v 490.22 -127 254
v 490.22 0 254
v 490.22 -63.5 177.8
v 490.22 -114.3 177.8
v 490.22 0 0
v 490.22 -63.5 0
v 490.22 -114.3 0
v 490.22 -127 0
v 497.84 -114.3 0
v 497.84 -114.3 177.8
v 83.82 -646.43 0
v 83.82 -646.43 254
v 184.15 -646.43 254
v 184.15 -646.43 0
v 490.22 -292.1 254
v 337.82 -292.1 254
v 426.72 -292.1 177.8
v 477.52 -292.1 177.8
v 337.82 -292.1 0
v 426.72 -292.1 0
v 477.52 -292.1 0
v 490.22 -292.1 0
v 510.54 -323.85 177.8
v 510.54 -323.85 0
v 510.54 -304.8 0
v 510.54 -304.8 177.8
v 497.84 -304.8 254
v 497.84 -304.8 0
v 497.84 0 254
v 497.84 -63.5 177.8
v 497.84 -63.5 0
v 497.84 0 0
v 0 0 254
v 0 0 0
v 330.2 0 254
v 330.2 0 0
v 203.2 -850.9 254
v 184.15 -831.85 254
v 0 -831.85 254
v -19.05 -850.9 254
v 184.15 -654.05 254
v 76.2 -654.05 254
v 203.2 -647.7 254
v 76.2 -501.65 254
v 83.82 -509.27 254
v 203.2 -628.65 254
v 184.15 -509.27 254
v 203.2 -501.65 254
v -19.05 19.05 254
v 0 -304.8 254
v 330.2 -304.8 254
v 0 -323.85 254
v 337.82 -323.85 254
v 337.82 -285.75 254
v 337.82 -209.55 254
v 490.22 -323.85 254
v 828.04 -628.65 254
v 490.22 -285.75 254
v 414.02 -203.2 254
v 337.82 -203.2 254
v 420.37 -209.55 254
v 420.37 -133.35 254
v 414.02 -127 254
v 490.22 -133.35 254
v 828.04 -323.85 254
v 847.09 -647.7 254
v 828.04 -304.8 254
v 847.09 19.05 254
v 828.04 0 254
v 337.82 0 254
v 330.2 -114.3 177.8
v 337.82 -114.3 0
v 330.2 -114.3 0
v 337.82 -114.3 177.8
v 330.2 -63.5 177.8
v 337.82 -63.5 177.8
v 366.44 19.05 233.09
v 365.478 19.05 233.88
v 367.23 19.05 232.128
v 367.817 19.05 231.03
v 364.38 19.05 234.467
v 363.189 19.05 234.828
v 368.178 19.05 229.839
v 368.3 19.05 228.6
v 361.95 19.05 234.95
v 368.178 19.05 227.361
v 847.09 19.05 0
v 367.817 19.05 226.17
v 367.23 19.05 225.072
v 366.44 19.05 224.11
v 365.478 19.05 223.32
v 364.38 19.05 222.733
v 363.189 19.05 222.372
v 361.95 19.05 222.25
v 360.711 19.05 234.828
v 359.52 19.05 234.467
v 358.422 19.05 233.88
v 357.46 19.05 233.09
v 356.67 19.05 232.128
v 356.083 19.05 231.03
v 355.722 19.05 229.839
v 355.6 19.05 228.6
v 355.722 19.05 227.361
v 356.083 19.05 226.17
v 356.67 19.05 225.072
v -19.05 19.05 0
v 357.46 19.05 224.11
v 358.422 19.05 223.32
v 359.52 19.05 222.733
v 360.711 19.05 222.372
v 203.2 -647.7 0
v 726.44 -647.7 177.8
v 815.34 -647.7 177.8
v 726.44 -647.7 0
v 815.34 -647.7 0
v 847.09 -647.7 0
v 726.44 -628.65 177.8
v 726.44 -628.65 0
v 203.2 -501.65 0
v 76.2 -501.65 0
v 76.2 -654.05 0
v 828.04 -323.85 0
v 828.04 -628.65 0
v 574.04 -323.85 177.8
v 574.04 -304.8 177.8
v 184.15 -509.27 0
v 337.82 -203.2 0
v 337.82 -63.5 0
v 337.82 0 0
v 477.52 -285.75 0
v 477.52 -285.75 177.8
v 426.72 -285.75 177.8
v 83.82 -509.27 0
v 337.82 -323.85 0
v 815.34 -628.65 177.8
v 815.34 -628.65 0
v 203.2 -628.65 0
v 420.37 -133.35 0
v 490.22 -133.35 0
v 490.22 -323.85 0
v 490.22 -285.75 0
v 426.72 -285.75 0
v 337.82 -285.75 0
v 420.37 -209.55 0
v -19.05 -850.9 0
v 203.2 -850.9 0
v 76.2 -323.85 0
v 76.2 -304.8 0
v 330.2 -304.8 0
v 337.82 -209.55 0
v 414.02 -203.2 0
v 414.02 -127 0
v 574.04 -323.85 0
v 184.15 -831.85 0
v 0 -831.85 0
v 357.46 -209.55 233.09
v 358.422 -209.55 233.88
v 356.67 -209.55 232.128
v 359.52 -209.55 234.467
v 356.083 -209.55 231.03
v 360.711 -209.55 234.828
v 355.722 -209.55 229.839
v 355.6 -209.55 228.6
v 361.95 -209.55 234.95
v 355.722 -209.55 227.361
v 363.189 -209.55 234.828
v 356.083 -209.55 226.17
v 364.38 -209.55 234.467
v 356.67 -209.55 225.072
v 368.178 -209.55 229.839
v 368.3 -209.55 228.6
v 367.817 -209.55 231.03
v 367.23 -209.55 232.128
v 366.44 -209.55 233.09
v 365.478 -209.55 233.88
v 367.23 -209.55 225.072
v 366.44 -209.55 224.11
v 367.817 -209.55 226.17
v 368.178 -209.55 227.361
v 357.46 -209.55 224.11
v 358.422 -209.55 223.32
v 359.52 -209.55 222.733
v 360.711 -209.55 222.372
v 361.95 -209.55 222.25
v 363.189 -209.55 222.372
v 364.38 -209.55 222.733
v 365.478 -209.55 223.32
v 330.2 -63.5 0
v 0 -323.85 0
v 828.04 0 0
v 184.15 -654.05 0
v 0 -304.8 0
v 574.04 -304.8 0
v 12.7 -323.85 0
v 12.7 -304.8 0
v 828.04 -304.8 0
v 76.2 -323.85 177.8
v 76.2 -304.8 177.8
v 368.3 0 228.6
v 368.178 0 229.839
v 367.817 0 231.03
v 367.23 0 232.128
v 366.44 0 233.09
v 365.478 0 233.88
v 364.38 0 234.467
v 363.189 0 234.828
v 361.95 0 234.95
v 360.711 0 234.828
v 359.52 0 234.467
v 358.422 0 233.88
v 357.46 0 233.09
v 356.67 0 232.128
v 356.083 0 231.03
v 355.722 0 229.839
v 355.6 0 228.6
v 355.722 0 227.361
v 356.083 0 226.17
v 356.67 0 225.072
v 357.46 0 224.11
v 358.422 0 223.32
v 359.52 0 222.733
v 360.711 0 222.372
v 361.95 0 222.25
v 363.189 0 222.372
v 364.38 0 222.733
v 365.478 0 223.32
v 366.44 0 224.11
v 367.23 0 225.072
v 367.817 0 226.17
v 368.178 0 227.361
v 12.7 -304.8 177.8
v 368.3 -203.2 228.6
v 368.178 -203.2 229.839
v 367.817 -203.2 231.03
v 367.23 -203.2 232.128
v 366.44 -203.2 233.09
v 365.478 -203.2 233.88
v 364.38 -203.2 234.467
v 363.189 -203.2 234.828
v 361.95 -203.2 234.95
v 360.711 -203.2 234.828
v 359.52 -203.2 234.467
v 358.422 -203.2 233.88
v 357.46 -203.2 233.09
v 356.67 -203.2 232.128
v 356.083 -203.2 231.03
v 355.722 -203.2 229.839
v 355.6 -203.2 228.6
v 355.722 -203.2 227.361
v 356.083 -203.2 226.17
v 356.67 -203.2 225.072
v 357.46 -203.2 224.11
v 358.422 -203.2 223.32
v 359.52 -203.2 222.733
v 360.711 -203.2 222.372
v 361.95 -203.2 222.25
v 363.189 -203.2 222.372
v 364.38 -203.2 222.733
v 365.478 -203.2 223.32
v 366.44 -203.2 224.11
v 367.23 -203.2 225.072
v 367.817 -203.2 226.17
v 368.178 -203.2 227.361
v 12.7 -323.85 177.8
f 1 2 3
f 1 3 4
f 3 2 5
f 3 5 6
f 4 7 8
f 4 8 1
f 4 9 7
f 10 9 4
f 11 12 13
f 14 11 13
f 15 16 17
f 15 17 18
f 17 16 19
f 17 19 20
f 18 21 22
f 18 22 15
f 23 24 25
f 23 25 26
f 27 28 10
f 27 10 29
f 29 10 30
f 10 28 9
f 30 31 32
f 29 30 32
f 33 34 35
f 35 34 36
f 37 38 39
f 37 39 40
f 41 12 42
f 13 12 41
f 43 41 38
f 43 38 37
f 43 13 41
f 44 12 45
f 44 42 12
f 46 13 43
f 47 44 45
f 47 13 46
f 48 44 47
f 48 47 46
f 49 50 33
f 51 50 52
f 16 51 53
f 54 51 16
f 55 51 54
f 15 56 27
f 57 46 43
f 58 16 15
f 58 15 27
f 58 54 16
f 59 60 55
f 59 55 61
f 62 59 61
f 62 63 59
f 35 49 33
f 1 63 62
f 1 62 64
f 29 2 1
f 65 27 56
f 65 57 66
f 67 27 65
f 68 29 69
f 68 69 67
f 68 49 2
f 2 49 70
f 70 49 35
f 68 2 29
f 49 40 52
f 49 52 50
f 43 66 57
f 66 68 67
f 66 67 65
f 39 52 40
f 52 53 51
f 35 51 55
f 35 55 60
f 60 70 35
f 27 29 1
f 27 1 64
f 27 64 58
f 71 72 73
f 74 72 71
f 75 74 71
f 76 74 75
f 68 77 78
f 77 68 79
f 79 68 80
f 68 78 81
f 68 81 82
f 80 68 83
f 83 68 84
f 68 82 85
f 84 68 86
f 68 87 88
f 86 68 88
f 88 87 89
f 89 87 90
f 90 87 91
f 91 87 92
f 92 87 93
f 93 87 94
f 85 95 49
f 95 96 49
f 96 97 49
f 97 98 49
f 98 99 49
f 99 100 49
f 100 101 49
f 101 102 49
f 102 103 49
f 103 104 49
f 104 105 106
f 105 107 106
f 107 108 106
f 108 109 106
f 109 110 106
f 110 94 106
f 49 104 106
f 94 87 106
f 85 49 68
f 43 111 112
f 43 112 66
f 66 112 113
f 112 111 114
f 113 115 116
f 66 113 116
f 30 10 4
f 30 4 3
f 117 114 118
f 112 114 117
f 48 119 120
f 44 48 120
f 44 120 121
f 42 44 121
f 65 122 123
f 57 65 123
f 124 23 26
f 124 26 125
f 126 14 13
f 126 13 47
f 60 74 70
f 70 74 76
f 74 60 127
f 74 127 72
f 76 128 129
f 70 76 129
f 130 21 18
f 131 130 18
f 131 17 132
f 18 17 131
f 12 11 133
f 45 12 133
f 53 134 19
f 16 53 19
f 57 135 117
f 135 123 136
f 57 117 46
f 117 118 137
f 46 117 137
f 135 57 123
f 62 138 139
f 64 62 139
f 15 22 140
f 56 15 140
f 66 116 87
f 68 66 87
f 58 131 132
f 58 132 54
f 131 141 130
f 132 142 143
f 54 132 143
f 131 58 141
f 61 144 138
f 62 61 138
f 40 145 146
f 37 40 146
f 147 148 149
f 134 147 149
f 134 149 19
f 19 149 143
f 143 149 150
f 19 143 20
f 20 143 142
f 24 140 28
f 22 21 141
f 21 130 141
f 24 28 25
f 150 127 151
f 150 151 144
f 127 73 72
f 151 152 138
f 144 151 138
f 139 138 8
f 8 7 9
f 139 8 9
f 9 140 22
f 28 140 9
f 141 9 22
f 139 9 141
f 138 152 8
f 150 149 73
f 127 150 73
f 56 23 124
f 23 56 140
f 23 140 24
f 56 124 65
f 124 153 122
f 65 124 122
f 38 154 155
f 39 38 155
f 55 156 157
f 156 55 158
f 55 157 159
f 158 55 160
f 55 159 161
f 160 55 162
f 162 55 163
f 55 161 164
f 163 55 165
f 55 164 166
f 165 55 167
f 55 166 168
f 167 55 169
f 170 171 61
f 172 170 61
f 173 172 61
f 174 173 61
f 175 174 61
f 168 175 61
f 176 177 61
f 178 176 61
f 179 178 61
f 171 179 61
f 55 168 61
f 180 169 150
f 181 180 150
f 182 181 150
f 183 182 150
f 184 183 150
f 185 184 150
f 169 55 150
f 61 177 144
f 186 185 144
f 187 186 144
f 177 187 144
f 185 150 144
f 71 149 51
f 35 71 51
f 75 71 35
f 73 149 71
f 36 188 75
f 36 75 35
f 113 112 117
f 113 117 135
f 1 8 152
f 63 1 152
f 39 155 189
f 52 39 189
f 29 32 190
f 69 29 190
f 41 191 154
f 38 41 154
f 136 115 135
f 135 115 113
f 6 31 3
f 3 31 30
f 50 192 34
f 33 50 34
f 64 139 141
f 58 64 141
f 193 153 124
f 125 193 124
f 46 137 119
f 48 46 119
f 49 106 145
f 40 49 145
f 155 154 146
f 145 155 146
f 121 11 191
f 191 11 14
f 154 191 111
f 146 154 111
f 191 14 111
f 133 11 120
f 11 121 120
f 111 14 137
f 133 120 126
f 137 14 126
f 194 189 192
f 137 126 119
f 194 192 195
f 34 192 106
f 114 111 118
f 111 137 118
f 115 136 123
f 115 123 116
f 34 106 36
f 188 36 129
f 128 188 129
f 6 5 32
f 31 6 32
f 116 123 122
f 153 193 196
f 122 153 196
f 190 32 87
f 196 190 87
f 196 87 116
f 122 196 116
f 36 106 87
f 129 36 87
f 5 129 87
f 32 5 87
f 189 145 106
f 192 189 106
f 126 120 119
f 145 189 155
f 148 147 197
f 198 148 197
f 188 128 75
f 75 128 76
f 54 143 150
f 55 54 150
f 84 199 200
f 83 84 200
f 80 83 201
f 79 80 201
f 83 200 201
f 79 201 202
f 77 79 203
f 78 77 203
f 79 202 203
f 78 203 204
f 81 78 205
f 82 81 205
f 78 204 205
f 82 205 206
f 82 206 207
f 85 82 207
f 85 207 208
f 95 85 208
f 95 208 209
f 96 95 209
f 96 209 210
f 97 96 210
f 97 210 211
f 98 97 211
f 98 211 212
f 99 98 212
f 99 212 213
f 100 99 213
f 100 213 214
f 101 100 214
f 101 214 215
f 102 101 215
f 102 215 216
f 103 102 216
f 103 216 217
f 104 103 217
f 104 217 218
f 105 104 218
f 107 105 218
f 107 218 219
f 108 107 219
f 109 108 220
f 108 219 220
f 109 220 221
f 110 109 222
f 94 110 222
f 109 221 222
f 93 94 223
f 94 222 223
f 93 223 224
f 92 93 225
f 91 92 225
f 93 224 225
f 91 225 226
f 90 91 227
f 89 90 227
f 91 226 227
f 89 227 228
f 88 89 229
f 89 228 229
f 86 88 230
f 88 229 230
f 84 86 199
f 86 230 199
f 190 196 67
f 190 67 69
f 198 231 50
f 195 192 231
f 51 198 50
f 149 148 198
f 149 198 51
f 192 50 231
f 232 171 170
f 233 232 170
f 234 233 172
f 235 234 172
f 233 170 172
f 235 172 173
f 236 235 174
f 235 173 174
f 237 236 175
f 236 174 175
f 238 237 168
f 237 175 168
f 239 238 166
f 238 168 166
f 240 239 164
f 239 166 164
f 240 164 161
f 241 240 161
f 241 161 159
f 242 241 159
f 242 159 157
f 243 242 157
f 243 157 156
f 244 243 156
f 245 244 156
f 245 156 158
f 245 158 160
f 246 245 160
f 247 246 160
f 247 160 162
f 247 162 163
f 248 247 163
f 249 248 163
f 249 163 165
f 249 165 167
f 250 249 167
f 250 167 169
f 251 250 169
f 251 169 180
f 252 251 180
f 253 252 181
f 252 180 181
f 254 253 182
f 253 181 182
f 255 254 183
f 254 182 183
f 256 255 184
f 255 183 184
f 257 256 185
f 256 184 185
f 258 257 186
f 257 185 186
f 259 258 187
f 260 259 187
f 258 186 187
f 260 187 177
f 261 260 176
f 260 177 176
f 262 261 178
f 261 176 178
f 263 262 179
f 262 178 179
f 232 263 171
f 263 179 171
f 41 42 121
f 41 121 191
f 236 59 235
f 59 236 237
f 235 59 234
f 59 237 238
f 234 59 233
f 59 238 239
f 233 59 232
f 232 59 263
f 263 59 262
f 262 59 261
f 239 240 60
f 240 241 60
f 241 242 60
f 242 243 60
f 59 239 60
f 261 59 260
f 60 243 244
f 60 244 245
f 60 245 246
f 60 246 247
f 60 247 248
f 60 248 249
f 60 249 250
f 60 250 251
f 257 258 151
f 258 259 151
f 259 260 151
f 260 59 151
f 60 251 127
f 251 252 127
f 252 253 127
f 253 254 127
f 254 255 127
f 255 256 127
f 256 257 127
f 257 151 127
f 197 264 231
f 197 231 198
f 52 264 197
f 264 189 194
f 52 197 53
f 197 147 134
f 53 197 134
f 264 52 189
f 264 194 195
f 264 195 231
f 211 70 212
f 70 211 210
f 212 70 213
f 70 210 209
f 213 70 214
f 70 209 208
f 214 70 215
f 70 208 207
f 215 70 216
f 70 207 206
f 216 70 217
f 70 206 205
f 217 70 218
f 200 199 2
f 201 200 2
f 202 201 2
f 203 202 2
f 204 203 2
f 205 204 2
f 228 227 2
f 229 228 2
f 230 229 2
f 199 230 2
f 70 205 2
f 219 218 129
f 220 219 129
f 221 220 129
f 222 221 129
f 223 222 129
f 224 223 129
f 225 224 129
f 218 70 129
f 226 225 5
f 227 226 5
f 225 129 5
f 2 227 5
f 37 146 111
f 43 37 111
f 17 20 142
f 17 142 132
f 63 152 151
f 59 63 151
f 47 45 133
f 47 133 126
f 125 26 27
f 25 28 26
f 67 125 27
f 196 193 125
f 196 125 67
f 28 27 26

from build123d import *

# Parameters (mm, degrees)
F0_W      = 100.33
F0_H      = 137.16
F0_W_2    = 330.2
F0_H_2    = 304.8
F1_DEPTH  = 254
F2_W      = 50.8
F2_H      = 177.8
F3_DEPTH  = 25.4
F4_W      = 50.8
F4_H      = 177.8
F5_DEPTH  = 177.8
F6_W      = 63.5
F6_H      = 177.8
F7_DEPTH  = 25.4
F8_W      = 63.5
F8_H      = 177.8
F9_DEPTH  = 25.4
F10_W     = 88.9
F10_H     = 177.8
F11_DEPTH = 25.4
F12_R     = 6.35
F13_DEPTH = 228.6


with BuildPart() as f1:
    # F0 (on Top) → F1 (new body)
    with BuildSketch(Plane.XY):
        Polygon((847.09, 19.05), (-19.05, 19.05), (-19.05, -323.85), (-19.05, -850.9), (203.2, -850.9), (203.2, -647.7), (847.09, -647.7), align=None)
        with Locations((133.985, -577.85)):
            Rectangle(F0_W, F0_H, mode=Mode.SUBTRACT)
        Polygon((828.04, -628.65), (203.2, -628.65), (203.2, -501.65), (76.2, -501.65), (76.2, -654.05), (184.15, -654.05), (184.15, -831.85), (0, -831.85), (0, -323.85), (337.82, -323.85), (337.82, -292.1), (490.22, -292.1), (490.22, -323.85), (668.02, -323.85), (675.64, -323.85), (828.04, -323.85), (828.04, -450.85), (828.04, -458.47), align=None, mode=Mode.SUBTRACT)
        with Locations((165.1, -152.4)):
            Rectangle(F0_W_2, F0_H_2, mode=Mode.SUBTRACT)
        Polygon((337.82, -285.75), (337.82, -209.55), (420.37, -209.55), (420.37, -133.35), (490.22, -133.35), (490.22, -285.75), align=None, mode=Mode.SUBTRACT)
        Polygon((337.82, -203.2), (337.82, 0), (490.22, 0), (490.22, -127), (414.02, -127), (414.02, -203.2), align=None, mode=Mode.SUBTRACT)
        with Locations((662.94, -152.4)):
            Rectangle(F0_W_2, F0_H_2, mode=Mode.SUBTRACT)
    extrude(amount=F1_DEPTH)

    # F2 (on face) → F3 (cut)
    with BuildSketch(Plane.XZ.offset(292.1)):
        with Locations((452.12, 88.9)):
            Rectangle(F2_W, F2_H)
    extrude(amount=-F3_DEPTH, mode=Mode.SUBTRACT)

    # F4 (on face) → F5 (cut)
    with BuildSketch(Plane.YZ.offset(497.84)):
        with Locations((-88.9, 88.9)):
            Rectangle(F4_W, F4_H)
    extrude(amount=-F5_DEPTH, mode=Mode.SUBTRACT)

    # F6 (on face) → F7 (cut)
    with BuildSketch(Plane.XZ.offset(323.85)):
        with Locations((44.45, 88.9)):
            Rectangle(F6_W, F6_H)
    extrude(amount=-F7_DEPTH, mode=Mode.SUBTRACT)

    # F8 (on face) → F9 (cut)
    with BuildSketch(Plane.XZ.offset(323.85)):
        with Locations((542.29, 88.9)):
            Rectangle(F8_W, F8_H)
    extrude(amount=-F9_DEPTH, mode=Mode.SUBTRACT)

    # F10 (on face) → F11 (cut)
    with BuildSketch(Plane.XZ.offset(647.7)):
        with Locations((770.89, 88.9)):
            Rectangle(F10_W, F10_H)
    extrude(amount=-F11_DEPTH, mode=Mode.SUBTRACT)

    # F12 (on face) → F13 (cut)
    with BuildSketch(Plane.XZ.offset(209.55)):
        with Locations((361.95, 228.6)):
            Circle(F12_R)
    extrude(amount=-F13_DEPTH, mode=Mode.SUBTRACT)


solid = f1.part
